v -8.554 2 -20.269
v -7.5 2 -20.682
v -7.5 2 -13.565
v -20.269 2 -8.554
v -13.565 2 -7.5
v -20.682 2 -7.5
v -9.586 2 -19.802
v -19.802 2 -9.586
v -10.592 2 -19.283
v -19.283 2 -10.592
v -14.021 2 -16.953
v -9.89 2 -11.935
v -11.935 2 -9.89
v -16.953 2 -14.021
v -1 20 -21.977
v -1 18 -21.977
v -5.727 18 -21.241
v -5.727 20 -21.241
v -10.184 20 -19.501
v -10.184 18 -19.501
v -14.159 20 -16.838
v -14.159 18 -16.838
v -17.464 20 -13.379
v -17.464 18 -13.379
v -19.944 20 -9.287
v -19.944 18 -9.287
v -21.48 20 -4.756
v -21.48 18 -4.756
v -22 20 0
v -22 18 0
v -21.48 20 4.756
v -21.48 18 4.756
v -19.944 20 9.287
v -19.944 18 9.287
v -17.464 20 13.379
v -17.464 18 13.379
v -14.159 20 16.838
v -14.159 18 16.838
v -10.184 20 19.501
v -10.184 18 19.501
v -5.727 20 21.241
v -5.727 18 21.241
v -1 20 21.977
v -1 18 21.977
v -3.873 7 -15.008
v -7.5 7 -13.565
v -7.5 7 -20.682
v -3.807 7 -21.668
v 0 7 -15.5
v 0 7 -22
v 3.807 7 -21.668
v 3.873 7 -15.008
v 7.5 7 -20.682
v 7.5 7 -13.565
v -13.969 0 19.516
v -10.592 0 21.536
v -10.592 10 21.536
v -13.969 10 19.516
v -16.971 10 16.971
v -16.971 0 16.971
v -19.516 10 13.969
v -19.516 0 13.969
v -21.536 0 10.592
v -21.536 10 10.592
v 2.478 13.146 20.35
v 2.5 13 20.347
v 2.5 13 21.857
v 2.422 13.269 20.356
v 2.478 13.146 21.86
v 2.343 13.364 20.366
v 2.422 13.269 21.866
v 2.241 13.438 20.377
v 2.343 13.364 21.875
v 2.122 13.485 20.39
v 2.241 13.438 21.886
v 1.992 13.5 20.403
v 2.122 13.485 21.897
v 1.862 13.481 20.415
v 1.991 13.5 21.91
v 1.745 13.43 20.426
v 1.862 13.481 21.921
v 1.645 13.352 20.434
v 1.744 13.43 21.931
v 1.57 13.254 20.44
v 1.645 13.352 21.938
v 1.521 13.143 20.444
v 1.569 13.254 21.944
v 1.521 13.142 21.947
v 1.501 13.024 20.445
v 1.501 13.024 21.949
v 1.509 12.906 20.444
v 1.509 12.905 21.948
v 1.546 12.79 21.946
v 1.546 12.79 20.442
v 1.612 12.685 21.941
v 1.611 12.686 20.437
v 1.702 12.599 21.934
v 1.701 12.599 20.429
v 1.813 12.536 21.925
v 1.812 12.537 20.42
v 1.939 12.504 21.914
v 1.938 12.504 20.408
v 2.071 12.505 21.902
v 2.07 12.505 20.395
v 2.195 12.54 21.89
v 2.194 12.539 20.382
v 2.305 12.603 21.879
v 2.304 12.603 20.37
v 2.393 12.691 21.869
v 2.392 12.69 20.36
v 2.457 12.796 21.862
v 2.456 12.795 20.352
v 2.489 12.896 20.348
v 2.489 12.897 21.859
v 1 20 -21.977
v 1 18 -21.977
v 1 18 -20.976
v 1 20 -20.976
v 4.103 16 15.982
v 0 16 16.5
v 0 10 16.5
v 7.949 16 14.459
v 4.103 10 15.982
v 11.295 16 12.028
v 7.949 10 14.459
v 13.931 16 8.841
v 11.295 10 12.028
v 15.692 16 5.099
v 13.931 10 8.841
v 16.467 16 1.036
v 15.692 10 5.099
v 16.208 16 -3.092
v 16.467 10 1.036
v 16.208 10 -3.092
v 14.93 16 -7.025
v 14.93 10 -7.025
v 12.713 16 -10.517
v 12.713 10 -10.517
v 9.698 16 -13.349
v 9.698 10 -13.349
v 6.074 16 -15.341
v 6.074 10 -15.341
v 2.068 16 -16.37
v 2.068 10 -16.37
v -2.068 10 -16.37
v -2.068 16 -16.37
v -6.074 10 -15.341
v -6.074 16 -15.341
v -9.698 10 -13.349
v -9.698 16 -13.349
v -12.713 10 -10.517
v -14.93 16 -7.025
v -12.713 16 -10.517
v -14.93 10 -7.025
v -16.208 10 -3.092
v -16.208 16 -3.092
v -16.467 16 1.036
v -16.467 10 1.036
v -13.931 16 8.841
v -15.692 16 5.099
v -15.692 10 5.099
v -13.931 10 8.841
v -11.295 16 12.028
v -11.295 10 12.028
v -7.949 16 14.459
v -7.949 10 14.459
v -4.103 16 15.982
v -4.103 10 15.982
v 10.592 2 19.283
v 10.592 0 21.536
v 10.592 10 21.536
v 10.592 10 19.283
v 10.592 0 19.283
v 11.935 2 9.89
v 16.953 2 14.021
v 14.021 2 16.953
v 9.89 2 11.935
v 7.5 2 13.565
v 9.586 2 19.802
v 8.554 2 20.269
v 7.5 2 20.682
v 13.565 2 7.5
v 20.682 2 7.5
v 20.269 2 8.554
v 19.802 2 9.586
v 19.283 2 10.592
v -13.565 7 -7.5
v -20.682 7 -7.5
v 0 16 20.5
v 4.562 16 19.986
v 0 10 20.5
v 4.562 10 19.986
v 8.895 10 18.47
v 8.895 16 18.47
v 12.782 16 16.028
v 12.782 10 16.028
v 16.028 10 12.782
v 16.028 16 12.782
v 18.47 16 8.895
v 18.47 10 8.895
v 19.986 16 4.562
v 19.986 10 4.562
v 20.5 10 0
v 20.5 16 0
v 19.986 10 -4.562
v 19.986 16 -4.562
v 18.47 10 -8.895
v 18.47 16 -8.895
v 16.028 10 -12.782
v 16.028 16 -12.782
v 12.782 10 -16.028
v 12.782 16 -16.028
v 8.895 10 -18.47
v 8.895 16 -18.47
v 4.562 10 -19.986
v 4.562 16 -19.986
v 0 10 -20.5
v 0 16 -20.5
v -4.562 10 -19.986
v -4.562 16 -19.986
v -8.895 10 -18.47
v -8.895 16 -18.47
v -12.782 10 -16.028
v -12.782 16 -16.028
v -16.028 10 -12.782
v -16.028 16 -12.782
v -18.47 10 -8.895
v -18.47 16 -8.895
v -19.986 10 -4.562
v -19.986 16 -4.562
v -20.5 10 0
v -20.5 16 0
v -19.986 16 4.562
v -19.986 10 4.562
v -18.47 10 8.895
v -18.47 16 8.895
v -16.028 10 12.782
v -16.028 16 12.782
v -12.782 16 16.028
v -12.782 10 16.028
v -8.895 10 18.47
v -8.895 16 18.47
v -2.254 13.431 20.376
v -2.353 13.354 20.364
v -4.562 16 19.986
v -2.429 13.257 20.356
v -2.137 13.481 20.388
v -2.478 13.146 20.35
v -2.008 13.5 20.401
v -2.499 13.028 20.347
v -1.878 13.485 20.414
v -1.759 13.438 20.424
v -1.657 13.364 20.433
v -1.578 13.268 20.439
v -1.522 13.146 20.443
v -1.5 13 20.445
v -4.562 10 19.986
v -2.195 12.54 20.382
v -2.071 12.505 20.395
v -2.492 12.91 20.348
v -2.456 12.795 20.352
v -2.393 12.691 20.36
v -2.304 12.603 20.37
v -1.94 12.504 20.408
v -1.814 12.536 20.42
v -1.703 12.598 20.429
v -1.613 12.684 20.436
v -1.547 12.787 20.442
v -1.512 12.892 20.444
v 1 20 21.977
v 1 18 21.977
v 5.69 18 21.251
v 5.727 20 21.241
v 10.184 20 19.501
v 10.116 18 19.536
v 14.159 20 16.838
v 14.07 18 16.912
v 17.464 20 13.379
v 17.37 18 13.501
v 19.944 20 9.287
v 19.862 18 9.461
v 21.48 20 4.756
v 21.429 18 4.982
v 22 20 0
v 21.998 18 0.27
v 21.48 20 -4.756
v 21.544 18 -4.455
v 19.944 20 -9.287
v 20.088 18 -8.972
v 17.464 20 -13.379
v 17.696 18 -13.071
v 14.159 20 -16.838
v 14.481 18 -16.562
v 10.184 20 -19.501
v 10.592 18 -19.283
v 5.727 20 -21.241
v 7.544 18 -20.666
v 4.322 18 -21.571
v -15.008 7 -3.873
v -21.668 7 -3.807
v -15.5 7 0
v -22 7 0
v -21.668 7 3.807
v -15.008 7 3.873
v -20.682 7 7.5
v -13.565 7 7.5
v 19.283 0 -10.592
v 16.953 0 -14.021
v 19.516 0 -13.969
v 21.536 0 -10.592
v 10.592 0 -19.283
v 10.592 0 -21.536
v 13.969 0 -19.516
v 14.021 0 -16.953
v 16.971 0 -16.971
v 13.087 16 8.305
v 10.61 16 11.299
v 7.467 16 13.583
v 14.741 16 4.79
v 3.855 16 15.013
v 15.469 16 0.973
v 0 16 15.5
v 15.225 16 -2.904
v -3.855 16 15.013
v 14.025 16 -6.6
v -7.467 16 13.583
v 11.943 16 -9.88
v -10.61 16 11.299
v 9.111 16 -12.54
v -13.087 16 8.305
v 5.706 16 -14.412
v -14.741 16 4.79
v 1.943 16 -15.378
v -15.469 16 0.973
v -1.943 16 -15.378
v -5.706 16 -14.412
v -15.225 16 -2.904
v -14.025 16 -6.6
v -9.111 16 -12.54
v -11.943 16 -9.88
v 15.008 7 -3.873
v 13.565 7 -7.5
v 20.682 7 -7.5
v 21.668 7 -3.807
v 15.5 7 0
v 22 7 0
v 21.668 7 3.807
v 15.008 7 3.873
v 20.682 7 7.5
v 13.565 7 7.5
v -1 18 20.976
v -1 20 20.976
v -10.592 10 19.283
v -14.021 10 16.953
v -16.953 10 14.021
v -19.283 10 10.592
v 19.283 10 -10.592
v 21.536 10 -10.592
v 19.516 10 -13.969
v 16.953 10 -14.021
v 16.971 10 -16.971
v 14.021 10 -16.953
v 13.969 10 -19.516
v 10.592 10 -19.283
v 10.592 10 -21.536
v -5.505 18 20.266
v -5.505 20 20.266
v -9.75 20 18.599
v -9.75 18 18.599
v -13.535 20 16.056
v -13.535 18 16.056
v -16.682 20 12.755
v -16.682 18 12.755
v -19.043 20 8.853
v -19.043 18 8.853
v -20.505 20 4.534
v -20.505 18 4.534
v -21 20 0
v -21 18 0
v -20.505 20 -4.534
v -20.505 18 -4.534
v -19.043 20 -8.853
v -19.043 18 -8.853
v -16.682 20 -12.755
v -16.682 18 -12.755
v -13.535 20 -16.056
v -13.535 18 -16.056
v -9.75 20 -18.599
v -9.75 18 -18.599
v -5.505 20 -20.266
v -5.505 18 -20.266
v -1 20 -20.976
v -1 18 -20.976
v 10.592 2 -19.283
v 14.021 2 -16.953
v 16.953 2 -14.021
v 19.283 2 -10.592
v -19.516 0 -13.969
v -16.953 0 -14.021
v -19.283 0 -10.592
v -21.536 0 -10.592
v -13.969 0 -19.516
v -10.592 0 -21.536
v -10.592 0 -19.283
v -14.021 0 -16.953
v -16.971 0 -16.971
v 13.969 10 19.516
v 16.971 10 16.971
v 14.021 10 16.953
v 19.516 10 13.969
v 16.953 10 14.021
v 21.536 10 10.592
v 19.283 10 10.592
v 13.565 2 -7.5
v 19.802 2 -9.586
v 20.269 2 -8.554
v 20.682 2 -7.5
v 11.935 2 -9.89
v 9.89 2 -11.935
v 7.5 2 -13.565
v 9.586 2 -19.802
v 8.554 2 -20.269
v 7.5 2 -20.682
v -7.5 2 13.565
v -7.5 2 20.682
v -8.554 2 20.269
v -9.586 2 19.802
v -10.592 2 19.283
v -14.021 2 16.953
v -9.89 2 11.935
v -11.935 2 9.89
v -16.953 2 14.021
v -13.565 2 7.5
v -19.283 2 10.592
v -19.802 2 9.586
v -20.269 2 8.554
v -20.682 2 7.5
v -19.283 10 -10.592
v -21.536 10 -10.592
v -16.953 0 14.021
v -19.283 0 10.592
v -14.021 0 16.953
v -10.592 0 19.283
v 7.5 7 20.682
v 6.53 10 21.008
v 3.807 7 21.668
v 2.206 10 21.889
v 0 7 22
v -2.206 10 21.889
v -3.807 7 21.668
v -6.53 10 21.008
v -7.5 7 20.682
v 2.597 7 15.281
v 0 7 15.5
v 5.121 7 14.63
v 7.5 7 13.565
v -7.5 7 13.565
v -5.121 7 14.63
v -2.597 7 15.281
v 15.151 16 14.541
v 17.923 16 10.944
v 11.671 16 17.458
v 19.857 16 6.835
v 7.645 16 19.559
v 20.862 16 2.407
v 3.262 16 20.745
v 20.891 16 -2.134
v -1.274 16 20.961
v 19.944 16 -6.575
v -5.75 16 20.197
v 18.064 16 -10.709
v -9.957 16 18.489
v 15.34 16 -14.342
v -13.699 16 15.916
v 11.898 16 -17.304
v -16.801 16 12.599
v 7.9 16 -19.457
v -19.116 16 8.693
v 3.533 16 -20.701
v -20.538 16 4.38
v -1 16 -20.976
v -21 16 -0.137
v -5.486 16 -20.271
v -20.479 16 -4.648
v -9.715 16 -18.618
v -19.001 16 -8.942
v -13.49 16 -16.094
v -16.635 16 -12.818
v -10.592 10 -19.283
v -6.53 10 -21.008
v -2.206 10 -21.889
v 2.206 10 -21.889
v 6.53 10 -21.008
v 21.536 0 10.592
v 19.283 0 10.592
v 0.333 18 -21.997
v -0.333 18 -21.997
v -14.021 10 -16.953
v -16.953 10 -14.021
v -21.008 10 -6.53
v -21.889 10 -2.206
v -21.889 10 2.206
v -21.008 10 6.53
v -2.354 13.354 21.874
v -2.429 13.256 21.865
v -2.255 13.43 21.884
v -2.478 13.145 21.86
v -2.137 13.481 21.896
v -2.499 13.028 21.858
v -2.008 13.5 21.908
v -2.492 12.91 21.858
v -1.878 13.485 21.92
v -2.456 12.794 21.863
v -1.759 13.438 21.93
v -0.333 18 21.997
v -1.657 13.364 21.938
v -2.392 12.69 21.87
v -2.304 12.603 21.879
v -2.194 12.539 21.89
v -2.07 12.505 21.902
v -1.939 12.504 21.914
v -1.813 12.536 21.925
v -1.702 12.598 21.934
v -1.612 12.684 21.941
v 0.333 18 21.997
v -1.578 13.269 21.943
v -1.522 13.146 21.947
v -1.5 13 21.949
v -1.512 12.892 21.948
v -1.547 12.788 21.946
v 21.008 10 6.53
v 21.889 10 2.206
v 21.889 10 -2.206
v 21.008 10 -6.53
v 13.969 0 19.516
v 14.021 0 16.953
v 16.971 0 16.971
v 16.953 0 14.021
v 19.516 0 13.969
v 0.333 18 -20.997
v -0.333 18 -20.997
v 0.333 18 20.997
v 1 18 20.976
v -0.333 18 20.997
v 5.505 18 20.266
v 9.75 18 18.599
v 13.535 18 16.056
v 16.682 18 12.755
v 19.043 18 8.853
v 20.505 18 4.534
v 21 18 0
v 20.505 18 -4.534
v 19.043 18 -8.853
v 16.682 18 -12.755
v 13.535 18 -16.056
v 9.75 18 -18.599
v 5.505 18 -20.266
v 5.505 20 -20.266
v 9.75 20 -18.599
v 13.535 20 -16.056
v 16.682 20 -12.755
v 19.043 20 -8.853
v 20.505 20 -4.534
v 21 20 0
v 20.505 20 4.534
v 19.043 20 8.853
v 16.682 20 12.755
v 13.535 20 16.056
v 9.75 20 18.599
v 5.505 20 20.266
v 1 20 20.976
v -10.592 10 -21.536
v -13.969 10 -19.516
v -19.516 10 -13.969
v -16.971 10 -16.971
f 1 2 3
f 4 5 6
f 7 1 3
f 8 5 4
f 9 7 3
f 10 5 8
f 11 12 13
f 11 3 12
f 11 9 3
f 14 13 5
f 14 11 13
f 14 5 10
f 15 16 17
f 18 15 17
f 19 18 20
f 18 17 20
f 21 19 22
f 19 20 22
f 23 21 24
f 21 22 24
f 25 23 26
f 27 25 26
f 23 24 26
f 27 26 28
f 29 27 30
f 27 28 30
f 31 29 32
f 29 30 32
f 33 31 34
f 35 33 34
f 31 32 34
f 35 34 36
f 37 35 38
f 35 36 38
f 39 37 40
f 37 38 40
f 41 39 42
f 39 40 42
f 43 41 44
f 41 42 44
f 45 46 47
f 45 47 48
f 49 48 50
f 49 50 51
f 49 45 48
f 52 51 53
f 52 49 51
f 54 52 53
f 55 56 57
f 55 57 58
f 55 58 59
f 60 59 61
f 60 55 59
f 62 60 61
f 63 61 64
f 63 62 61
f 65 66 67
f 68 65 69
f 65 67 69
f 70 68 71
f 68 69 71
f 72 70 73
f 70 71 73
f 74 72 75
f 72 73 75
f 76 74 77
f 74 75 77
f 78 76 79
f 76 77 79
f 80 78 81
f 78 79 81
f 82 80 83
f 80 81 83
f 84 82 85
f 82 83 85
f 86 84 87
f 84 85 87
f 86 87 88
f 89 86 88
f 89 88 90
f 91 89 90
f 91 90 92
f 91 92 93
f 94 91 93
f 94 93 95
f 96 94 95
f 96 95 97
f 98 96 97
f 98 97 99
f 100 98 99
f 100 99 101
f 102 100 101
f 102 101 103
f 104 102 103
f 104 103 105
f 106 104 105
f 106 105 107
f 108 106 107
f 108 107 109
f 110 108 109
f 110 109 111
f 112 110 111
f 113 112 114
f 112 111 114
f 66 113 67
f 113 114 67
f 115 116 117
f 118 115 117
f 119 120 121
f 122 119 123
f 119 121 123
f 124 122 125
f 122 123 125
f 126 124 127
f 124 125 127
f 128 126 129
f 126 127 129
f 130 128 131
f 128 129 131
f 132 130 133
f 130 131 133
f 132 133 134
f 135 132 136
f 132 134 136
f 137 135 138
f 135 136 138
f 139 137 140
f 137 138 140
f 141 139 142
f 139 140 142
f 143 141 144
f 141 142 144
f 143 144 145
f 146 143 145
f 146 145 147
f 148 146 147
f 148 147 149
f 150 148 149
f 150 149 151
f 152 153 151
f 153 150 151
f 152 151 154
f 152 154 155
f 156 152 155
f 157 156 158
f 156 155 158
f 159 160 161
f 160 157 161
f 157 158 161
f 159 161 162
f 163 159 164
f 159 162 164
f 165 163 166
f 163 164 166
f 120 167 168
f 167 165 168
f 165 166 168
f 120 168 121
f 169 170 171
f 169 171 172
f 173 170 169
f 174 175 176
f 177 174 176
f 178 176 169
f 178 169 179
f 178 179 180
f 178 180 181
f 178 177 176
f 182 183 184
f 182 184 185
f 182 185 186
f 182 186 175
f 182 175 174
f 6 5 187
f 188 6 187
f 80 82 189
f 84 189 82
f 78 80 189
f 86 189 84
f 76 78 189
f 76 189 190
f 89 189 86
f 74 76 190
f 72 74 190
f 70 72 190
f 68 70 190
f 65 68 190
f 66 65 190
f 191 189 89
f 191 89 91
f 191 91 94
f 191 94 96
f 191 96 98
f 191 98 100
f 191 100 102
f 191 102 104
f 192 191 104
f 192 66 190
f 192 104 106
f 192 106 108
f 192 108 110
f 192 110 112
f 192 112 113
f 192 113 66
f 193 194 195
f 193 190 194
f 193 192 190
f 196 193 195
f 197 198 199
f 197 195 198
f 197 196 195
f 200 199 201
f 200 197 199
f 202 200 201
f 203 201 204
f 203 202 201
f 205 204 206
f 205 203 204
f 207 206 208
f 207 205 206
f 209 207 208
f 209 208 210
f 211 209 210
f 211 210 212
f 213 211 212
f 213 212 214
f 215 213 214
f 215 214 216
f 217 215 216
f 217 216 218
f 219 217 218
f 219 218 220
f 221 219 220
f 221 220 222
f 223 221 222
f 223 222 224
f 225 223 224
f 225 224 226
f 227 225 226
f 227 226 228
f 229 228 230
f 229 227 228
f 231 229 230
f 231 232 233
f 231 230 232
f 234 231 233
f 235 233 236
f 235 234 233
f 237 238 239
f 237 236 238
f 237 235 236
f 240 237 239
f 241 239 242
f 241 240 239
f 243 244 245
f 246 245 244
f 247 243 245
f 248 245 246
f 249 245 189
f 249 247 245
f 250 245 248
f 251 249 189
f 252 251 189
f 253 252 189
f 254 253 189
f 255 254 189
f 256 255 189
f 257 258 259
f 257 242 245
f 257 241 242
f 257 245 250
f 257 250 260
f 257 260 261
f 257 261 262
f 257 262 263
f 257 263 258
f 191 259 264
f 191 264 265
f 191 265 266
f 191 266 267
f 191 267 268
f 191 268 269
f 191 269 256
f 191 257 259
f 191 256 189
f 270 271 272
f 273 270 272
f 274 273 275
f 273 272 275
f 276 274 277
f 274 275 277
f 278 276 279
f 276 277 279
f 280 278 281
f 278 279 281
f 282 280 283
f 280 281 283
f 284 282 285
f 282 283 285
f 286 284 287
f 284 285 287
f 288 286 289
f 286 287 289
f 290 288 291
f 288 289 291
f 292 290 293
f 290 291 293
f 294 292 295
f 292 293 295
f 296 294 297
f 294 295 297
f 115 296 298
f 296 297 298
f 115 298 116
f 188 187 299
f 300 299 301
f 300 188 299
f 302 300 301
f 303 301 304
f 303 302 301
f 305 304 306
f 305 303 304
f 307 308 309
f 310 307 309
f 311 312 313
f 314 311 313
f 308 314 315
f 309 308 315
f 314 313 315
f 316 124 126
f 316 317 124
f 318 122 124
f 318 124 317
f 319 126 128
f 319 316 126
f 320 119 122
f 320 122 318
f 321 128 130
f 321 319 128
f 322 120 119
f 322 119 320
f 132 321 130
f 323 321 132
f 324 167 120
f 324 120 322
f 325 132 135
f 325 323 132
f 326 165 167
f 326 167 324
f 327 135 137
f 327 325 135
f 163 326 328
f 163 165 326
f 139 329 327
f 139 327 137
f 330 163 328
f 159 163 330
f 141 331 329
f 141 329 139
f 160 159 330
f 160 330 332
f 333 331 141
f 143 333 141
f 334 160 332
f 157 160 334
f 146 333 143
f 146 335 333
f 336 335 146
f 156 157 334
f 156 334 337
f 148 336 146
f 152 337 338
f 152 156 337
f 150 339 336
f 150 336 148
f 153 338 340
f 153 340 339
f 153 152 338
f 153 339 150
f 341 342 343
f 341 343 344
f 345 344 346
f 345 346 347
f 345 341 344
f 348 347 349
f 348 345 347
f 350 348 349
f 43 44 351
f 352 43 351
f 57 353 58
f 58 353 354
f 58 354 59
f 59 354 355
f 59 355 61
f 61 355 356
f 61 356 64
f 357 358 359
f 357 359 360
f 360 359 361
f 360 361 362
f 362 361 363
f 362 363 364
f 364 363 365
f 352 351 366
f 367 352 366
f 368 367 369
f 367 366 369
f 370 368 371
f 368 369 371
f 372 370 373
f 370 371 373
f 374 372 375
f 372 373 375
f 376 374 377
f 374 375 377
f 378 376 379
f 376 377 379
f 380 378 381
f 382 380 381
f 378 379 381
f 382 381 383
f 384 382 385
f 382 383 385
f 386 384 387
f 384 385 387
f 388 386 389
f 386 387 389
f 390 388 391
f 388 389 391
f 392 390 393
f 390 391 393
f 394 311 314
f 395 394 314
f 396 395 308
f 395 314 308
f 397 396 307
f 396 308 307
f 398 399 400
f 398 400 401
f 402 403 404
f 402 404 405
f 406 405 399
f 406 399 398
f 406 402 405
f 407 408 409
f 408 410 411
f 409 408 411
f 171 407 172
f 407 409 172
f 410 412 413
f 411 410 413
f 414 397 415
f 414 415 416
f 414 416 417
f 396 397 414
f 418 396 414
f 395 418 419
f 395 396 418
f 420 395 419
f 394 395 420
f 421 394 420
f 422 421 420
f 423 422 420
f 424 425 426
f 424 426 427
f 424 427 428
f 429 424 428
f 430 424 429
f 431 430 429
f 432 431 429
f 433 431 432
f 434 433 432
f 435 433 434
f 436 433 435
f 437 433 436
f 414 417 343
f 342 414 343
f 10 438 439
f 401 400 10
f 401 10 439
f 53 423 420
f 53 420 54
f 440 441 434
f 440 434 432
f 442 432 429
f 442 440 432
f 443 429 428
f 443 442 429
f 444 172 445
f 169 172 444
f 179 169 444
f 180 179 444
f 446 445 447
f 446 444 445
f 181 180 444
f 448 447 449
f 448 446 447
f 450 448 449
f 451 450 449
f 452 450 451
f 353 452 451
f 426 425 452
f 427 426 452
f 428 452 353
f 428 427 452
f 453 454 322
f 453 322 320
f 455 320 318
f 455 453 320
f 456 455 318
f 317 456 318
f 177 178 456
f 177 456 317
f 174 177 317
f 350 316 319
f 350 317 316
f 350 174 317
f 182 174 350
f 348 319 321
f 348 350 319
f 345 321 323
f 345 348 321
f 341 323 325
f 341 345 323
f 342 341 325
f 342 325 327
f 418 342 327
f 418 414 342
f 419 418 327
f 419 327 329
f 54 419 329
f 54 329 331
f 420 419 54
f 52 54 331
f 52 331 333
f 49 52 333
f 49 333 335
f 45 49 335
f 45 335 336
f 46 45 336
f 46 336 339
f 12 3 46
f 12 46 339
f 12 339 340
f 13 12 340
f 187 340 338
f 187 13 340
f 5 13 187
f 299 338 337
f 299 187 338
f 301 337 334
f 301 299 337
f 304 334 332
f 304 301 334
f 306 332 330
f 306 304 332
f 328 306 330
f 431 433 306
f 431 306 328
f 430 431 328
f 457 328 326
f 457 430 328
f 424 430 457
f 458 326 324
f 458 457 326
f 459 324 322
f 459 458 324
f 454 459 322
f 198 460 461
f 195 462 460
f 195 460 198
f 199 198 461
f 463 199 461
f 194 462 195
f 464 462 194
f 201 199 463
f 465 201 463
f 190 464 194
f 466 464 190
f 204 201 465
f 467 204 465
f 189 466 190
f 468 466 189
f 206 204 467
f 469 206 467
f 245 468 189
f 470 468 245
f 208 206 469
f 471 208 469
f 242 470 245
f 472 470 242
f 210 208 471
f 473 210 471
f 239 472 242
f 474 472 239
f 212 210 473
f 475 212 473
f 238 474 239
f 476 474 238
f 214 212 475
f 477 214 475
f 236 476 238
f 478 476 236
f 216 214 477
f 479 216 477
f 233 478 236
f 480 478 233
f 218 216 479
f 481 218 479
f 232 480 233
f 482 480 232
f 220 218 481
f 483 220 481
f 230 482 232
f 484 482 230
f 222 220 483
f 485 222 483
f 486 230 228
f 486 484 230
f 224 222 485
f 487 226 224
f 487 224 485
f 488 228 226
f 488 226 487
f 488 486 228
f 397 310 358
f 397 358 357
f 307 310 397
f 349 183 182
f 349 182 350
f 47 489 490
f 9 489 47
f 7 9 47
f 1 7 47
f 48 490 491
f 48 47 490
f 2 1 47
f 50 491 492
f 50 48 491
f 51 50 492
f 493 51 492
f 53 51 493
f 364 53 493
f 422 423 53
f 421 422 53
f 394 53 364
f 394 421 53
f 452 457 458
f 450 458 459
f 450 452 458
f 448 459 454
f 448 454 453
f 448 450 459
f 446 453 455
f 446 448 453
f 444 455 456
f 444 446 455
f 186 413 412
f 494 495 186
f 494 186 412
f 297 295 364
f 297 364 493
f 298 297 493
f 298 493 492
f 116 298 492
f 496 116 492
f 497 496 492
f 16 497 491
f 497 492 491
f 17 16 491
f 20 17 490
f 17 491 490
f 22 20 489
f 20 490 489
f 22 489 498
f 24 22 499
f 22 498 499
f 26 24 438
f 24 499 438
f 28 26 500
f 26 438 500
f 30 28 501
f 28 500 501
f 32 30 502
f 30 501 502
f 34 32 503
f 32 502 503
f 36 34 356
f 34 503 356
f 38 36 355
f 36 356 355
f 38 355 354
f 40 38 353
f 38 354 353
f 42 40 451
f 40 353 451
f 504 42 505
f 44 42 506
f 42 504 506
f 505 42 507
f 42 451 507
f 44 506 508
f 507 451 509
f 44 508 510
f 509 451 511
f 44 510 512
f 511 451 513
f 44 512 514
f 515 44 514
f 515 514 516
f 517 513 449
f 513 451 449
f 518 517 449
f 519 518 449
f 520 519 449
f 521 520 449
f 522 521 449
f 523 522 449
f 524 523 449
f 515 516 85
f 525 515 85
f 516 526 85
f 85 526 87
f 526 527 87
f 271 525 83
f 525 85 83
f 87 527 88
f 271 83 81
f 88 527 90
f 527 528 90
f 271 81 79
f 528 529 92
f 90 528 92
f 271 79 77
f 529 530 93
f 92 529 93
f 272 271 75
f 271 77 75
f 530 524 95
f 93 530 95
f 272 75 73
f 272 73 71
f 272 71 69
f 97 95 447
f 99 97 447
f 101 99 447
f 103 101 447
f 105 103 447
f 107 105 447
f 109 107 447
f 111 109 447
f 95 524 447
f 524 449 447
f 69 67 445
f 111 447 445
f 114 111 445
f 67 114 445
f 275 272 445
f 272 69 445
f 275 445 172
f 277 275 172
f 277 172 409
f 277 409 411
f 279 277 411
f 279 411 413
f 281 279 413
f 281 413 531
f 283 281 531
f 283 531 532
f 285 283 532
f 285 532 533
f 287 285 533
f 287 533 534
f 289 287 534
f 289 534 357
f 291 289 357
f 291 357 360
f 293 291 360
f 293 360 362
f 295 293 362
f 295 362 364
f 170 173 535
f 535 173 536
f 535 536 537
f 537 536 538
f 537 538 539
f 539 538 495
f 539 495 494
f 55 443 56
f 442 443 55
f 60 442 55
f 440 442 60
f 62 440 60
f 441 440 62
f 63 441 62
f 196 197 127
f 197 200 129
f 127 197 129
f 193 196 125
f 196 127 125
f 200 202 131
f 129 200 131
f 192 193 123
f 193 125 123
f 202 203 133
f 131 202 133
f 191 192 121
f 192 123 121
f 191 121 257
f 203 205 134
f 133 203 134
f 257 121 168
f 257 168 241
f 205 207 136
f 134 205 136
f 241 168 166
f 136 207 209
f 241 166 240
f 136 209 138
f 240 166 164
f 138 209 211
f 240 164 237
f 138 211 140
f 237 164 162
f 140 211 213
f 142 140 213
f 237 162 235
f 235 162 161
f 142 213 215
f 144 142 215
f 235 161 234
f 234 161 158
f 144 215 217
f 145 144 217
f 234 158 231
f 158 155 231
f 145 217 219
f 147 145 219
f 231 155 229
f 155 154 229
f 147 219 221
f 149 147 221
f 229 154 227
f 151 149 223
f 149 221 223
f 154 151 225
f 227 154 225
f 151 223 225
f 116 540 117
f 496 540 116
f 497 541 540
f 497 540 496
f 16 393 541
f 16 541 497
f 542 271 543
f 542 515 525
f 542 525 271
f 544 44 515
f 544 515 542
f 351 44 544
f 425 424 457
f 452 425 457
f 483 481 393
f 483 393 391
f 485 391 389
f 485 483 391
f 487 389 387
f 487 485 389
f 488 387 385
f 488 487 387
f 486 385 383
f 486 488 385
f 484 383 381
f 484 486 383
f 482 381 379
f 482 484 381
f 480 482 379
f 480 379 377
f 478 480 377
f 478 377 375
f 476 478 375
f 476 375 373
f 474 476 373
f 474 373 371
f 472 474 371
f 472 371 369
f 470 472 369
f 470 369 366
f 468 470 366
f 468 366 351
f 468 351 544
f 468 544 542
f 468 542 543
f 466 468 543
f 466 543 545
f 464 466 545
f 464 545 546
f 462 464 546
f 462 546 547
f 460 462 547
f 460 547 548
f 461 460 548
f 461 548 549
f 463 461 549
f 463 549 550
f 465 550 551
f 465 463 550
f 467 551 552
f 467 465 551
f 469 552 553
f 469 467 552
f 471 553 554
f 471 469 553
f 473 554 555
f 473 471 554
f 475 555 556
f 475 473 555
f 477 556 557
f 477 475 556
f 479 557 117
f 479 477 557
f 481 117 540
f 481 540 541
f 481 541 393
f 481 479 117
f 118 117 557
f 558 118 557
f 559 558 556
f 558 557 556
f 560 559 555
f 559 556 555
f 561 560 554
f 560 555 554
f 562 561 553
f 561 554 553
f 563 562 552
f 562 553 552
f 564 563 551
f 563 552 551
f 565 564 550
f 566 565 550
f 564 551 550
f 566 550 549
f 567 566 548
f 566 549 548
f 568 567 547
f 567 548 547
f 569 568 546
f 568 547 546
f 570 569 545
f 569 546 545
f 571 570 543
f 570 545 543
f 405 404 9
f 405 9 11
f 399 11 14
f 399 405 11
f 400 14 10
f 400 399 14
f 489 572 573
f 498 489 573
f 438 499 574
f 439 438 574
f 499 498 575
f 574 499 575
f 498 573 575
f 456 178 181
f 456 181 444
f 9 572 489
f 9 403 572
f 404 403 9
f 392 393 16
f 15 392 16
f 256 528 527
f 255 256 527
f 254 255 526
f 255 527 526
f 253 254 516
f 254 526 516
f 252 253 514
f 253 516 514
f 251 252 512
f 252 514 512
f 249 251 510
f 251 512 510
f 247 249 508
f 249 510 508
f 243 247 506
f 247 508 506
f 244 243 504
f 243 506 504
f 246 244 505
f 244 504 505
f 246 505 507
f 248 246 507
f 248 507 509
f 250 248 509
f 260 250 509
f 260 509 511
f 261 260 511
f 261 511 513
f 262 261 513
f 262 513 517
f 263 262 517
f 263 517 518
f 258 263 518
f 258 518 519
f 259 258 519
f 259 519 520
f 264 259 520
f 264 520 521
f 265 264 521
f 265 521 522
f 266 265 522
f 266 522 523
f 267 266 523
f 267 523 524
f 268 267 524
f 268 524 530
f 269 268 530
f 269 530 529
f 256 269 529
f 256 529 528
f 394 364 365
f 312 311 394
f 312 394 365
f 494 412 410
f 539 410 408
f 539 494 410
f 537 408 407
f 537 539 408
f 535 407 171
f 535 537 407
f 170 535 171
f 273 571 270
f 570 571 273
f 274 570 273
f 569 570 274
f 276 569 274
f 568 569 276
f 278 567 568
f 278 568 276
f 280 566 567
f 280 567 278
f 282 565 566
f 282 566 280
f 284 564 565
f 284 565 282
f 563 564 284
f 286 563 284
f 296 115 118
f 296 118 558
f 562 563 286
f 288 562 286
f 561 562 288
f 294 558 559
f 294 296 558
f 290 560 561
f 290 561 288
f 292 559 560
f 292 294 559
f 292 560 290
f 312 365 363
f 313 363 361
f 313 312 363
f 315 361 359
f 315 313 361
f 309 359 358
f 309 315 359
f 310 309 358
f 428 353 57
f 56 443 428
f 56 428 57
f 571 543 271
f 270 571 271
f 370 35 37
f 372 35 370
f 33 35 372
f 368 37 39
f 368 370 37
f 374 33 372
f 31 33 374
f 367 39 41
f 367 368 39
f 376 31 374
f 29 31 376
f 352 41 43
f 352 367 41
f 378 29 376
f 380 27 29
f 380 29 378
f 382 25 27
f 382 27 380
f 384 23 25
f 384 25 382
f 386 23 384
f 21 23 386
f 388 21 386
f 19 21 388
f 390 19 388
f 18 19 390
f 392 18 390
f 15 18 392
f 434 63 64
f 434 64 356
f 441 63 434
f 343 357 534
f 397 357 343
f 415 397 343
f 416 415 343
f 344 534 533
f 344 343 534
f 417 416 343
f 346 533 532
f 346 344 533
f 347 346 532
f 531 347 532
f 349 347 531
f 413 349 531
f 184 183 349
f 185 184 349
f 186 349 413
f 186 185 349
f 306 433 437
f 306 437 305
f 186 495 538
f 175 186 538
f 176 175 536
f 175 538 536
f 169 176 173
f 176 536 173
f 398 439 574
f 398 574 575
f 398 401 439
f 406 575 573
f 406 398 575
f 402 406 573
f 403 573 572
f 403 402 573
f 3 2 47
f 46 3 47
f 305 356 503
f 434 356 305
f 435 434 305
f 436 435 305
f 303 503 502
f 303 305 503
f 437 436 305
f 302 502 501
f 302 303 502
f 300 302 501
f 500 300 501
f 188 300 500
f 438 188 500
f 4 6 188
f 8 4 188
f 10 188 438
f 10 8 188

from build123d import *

# Parameters (mm, degrees)
EXTRUDE_1_DEPTH          = 2
EXTRUDE_1_2_DEPTH        = 2
EXTRUDE_1_3_DEPTH        = 2
EXTRUDE_1_4_DEPTH        = 2
EXTRUDE_2_DEPTH          = 8
SKETCH_5_R               = 22
SKETCH_5_R_2             = 20.5
EXTRUDE_3_DEPTH          = 8
SKETCH_6_R               = 16.5
SKETCH_6_R_2             = 15.5
EXTRUDE_4_DEPTH          = 7
CUT_EXTRUDE_START        = -10
SKETCH_7_R               = 15.5
CUT_EXTRUDE_1_DEPTH      = 10
SKETCH_8_W               = 15
SKETCH_8_H               = 5
CUT_EXTRUDE_2_DEPTH      = 36.944401511
PATTERN_CIRCULAR_1_COUNT = 2
PATTERN_CIRCULAR_1_ANGLE = 90
EXTRUDE_5_DEPTH          = 2
CUT_EXTRUDE_START_2      = 30
SKETCH_10_R              = 0.5
CUT_EXTRUDE_3_DEPTH      = 10
CUT_EXTRUDE_START_3      = -2
SKETCH_16_R              = 21
CUT_EXTRUDE_5_DEPTH      = 2


with BuildPart() as part:
    # 草图1 → 凸台-拉伸1 (new body)
    with BuildSketch(Plane(origin=(0, 0, 0), x_dir=(1, 0, 0), z_dir=(0, 1, 0))):
        with BuildLine():
            Line((-10.591663047, 21.536403458), (-10.591663047, 19.282548429))
            ThreePointArc((-10.591663047, 19.282548429), (-15.556349186, 15.556349186), (-19.282548429, 10.591663047))
            Line((-19.282548429, 10.591663047), (-21.536403458, 10.591663047))
            ThreePointArc((-21.536403458, 10.591663047), (-16.970562748, 16.970562748), (-10.591663047, 21.536403458))
        make_face()
    extrude(amount=EXTRUDE_1_DEPTH)



with BuildPart() as body_2:
    # 草图1 → Extrude 1 2 (new body)
    with BuildSketch(Plane(origin=(0, 0, 0), x_dir=(1, 0, 0), z_dir=(0, 1, 0))):
        with BuildLine():
            Line((10.591663047, 21.536403458), (10.591663047, 19.282548429))
            ThreePointArc((10.591663047, 19.282548429), (15.556349186, 15.556349186), (19.282548429, 10.591663047))
            Line((19.282548429, 10.591663047), (21.536403458, 10.591663047))
            ThreePointArc((21.536403458, 10.591663047), (16.970562748, 16.970562748), (10.591663047, 21.536403458))
        make_face()
    extrude(amount=EXTRUDE_1_2_DEPTH)


with BuildPart() as body_3:
    # 草图1 → Extrude 1 3 (new body)
    with BuildSketch(Plane(origin=(0, 0, 0), x_dir=(1, 0, 0), z_dir=(0, 1, 0))):
        with BuildLine():
            Line((-21.536403458, -10.591663047), (-19.282548429, -10.591663047))
            ThreePointArc((-19.282548429, -10.591663047), (-15.556349186, -15.556349186), (-10.591663047, -19.282548429))
            Line((-10.591663047, -19.282548429), (-10.591663047, -21.536403458))
            ThreePointArc((-10.591663047, -21.536403458), (-16.970562748, -16.970562748), (-21.536403458, -10.591663047))
        make_face()
    extrude(amount=EXTRUDE_1_3_DEPTH)


with BuildPart() as body_4:
    # 草图1 → Extrude 1 4 (new body)
    with BuildSketch(Plane(origin=(0, 0, 0), x_dir=(1, 0, 0), z_dir=(0, 1, 0))):
        with BuildLine():
            Line((21.536403458, -10.591663047), (19.282548429, -10.591663047))
            ThreePointArc((19.282548429, -10.591663047), (15.556349186, -15.556349186), (10.591663047, -19.282548429))
            Line((10.591663047, -19.282548429), (10.591663047, -21.536403458))
            ThreePointArc((10.591663047, -21.536403458), (16.970562748, -16.970562748), (21.536403458, -10.591663047))
        make_face()
    extrude(amount=EXTRUDE_1_4_DEPTH)


with BuildPart() as part_1:
    add(part.part)

    add(body_2.part)  # 凸台-拉伸2 merges body 2

    add(body_3.part)  # 凸台-拉伸2 merges body 3

    add(body_4.part)  # 凸台-拉伸2 merges body 4
    # 草图4 → 凸台-拉伸2 (add)
    with BuildSketch(Plane(origin=(0, 2, 0), x_dir=(1, 0, 0), z_dir=(0, 1, 0))):
        with BuildLine():
            Line((-10.591663047, 21.536403458), (-10.591663047, 19.282548429))
            ThreePointArc((-10.591663047, 19.282548429), (0, 22), (10.591663047, 19.282548429))
            Line((10.591663047, 19.282548429), (10.591663047, 21.536403458))
            ThreePointArc((10.591663047, 21.536403458), (16.970562748, 16.970562748), (21.536403458, 10.591663047))
            Line((21.536403458, 10.591663047), (19.282548429, 10.591663047))
            ThreePointArc((19.282548429, 10.591663047), (22, 0), (19.282548429, -10.591663047))
            Line((19.282548429, -10.591663047), (21.536403458, -10.591663047))
            ThreePointArc((21.536403458, -10.591663047), (16.970562748, -16.970562748), (10.591663047, -21.536403458))
            Line((10.591663047, -21.536403458), (10.591663047, -19.282548429))
            ThreePointArc((10.591663047, -19.282548429), (0, -22), (-10.591663047, -19.282548429))
            Line((-10.591663047, -19.282548429), (-10.591663047, -21.536403458))
            ThreePointArc((-10.591663047, -21.536403458), (-16.970562748, -16.970562748), (-21.536403458, -10.591663047))
            Line((-21.536403458, -10.591663047), (-19.282548429, -10.591663047))
            ThreePointArc((-19.282548429, -10.591663047), (-22, 0), (-19.282548429, 10.591663047))
            Line((-19.282548429, 10.591663047), (-21.536403458, 10.591663047))
            ThreePointArc((-21.536403458, 10.591663047), (-16.970562748, 16.970562748), (-10.591663047, 21.536403458))
        make_face()
    extrude(amount=EXTRUDE_2_DEPTH)

    # 草图5 → 凸台-拉伸3 (add)
    with BuildSketch(Plane(origin=(0, 10, 0), x_dir=(1, 0, 0), z_dir=(0, 1, 0))):
        with Locations(Location((0, 0, 0), (0, 0, 61.22055739))):
            Circle(SKETCH_5_R)
        with Locations(Location((0, 0, 0), (0, 0, 270))):
            Circle(SKETCH_5_R_2, mode=Mode.SUBTRACT)
    extrude(amount=EXTRUDE_3_DEPTH)

    # 草图6 → 凸台-拉伸4 (add)
    with BuildSketch(Plane(origin=(0, 10, 0), x_dir=(1, 0, 0), z_dir=(0, 1, 0))):
        with Locations(Location((0, 0, 0), (0, 0, 270))):
            Circle(SKETCH_6_R)
        with Locations(Location((0, 0, 0), (0, 0, 270))):
            Circle(SKETCH_6_R_2, mode=Mode.SUBTRACT)
    extrude(amount=EXTRUDE_4_DEPTH)

    # 草图7 → 切除-拉伸1 (cut)
    with BuildSketch(Plane(origin=(0, 10, 0), x_dir=(1, 0, 0), z_dir=(0, 1, 0)).offset(CUT_EXTRUDE_START)):
        with Locations(Location((0, 0, 0), (0, 0, 270))):
            Circle(SKETCH_7_R)
    extrude(amount=CUT_EXTRUDE_1_DEPTH, mode=Mode.SUBTRACT)

    # 草图8 → 切除-拉伸2 (cut, symmetric)
    with BuildSketch(Plane.XY):
        with Locations((0, 4.5)):
            Rectangle(SKETCH_8_W, SKETCH_8_H)
    cut_extrude_2 = extrude(amount=CUT_EXTRUDE_2_DEPTH, both=True, mode=Mode.SUBTRACT)

    # 阵列(圆周)1: 切除-拉伸2 ×2 about axis
    pattern_circular_1_axis = Axis((0, 10, 0), (0, -1, 0))
    for i in range(1, PATTERN_CIRCULAR_1_COUNT):
        add(cut_extrude_2.rotate(pattern_circular_1_axis, i * PATTERN_CIRCULAR_1_ANGLE / (PATTERN_CIRCULAR_1_COUNT - 1)), mode=Mode.SUBTRACT)

    # 草图9 → 凸台-拉伸5 (add)
    with BuildSketch(Plane(origin=(0, 18, 0), x_dir=(1, 0, 0), z_dir=(0, 1, 0))):
        with BuildLine():
            Line((1, -20.976176963), (1, -21.977260976))
            ThreePointArc((1, -21.977260976), (22, 0), (1, 21.977260976))
            Line((1, 21.977260976), (1, 20.976176963))
            ThreePointArc((1, 20.976176963), (21, 0), (1, -20.976176963))
        make_face()
        with BuildLine():
            Line((-1, 20.976176963), (-1, 21.977260976))
            ThreePointArc((-1, 21.977260976), (-22, 0), (-1, -21.977260976))
            Line((-1, -21.977260976), (-1, -20.976176963))
            ThreePointArc((-1, -20.976176963), (-21, 0), (-1, 20.976176963))
        make_face()
    extrude(amount=EXTRUDE_5_DEPTH)

    # 草图10 → 切除-拉伸3 (cut)
    with BuildSketch(Plane.XY.offset(CUT_EXTRUDE_START_2)):
        with Locations((-2, 13)):
            Circle(SKETCH_10_R)
        with Locations((2, 13)):
            Circle(SKETCH_10_R)
    extrude(amount=-CUT_EXTRUDE_3_DEPTH, mode=Mode.SUBTRACT)

    # 草图16 → 切除-拉伸5 (cut)
    with BuildSketch(Plane(origin=(0, 18, 0), x_dir=(1, 0, 0), z_dir=(0, 1, 0)).offset(CUT_EXTRUDE_START_3)):
        with Locations(Location((0, 0, 0), (0, 0, 92.729402637))):
            Circle(SKETCH_16_R)
    extrude(amount=CUT_EXTRUDE_5_DEPTH, mode=Mode.SUBTRACT)


solid = part_1.part
